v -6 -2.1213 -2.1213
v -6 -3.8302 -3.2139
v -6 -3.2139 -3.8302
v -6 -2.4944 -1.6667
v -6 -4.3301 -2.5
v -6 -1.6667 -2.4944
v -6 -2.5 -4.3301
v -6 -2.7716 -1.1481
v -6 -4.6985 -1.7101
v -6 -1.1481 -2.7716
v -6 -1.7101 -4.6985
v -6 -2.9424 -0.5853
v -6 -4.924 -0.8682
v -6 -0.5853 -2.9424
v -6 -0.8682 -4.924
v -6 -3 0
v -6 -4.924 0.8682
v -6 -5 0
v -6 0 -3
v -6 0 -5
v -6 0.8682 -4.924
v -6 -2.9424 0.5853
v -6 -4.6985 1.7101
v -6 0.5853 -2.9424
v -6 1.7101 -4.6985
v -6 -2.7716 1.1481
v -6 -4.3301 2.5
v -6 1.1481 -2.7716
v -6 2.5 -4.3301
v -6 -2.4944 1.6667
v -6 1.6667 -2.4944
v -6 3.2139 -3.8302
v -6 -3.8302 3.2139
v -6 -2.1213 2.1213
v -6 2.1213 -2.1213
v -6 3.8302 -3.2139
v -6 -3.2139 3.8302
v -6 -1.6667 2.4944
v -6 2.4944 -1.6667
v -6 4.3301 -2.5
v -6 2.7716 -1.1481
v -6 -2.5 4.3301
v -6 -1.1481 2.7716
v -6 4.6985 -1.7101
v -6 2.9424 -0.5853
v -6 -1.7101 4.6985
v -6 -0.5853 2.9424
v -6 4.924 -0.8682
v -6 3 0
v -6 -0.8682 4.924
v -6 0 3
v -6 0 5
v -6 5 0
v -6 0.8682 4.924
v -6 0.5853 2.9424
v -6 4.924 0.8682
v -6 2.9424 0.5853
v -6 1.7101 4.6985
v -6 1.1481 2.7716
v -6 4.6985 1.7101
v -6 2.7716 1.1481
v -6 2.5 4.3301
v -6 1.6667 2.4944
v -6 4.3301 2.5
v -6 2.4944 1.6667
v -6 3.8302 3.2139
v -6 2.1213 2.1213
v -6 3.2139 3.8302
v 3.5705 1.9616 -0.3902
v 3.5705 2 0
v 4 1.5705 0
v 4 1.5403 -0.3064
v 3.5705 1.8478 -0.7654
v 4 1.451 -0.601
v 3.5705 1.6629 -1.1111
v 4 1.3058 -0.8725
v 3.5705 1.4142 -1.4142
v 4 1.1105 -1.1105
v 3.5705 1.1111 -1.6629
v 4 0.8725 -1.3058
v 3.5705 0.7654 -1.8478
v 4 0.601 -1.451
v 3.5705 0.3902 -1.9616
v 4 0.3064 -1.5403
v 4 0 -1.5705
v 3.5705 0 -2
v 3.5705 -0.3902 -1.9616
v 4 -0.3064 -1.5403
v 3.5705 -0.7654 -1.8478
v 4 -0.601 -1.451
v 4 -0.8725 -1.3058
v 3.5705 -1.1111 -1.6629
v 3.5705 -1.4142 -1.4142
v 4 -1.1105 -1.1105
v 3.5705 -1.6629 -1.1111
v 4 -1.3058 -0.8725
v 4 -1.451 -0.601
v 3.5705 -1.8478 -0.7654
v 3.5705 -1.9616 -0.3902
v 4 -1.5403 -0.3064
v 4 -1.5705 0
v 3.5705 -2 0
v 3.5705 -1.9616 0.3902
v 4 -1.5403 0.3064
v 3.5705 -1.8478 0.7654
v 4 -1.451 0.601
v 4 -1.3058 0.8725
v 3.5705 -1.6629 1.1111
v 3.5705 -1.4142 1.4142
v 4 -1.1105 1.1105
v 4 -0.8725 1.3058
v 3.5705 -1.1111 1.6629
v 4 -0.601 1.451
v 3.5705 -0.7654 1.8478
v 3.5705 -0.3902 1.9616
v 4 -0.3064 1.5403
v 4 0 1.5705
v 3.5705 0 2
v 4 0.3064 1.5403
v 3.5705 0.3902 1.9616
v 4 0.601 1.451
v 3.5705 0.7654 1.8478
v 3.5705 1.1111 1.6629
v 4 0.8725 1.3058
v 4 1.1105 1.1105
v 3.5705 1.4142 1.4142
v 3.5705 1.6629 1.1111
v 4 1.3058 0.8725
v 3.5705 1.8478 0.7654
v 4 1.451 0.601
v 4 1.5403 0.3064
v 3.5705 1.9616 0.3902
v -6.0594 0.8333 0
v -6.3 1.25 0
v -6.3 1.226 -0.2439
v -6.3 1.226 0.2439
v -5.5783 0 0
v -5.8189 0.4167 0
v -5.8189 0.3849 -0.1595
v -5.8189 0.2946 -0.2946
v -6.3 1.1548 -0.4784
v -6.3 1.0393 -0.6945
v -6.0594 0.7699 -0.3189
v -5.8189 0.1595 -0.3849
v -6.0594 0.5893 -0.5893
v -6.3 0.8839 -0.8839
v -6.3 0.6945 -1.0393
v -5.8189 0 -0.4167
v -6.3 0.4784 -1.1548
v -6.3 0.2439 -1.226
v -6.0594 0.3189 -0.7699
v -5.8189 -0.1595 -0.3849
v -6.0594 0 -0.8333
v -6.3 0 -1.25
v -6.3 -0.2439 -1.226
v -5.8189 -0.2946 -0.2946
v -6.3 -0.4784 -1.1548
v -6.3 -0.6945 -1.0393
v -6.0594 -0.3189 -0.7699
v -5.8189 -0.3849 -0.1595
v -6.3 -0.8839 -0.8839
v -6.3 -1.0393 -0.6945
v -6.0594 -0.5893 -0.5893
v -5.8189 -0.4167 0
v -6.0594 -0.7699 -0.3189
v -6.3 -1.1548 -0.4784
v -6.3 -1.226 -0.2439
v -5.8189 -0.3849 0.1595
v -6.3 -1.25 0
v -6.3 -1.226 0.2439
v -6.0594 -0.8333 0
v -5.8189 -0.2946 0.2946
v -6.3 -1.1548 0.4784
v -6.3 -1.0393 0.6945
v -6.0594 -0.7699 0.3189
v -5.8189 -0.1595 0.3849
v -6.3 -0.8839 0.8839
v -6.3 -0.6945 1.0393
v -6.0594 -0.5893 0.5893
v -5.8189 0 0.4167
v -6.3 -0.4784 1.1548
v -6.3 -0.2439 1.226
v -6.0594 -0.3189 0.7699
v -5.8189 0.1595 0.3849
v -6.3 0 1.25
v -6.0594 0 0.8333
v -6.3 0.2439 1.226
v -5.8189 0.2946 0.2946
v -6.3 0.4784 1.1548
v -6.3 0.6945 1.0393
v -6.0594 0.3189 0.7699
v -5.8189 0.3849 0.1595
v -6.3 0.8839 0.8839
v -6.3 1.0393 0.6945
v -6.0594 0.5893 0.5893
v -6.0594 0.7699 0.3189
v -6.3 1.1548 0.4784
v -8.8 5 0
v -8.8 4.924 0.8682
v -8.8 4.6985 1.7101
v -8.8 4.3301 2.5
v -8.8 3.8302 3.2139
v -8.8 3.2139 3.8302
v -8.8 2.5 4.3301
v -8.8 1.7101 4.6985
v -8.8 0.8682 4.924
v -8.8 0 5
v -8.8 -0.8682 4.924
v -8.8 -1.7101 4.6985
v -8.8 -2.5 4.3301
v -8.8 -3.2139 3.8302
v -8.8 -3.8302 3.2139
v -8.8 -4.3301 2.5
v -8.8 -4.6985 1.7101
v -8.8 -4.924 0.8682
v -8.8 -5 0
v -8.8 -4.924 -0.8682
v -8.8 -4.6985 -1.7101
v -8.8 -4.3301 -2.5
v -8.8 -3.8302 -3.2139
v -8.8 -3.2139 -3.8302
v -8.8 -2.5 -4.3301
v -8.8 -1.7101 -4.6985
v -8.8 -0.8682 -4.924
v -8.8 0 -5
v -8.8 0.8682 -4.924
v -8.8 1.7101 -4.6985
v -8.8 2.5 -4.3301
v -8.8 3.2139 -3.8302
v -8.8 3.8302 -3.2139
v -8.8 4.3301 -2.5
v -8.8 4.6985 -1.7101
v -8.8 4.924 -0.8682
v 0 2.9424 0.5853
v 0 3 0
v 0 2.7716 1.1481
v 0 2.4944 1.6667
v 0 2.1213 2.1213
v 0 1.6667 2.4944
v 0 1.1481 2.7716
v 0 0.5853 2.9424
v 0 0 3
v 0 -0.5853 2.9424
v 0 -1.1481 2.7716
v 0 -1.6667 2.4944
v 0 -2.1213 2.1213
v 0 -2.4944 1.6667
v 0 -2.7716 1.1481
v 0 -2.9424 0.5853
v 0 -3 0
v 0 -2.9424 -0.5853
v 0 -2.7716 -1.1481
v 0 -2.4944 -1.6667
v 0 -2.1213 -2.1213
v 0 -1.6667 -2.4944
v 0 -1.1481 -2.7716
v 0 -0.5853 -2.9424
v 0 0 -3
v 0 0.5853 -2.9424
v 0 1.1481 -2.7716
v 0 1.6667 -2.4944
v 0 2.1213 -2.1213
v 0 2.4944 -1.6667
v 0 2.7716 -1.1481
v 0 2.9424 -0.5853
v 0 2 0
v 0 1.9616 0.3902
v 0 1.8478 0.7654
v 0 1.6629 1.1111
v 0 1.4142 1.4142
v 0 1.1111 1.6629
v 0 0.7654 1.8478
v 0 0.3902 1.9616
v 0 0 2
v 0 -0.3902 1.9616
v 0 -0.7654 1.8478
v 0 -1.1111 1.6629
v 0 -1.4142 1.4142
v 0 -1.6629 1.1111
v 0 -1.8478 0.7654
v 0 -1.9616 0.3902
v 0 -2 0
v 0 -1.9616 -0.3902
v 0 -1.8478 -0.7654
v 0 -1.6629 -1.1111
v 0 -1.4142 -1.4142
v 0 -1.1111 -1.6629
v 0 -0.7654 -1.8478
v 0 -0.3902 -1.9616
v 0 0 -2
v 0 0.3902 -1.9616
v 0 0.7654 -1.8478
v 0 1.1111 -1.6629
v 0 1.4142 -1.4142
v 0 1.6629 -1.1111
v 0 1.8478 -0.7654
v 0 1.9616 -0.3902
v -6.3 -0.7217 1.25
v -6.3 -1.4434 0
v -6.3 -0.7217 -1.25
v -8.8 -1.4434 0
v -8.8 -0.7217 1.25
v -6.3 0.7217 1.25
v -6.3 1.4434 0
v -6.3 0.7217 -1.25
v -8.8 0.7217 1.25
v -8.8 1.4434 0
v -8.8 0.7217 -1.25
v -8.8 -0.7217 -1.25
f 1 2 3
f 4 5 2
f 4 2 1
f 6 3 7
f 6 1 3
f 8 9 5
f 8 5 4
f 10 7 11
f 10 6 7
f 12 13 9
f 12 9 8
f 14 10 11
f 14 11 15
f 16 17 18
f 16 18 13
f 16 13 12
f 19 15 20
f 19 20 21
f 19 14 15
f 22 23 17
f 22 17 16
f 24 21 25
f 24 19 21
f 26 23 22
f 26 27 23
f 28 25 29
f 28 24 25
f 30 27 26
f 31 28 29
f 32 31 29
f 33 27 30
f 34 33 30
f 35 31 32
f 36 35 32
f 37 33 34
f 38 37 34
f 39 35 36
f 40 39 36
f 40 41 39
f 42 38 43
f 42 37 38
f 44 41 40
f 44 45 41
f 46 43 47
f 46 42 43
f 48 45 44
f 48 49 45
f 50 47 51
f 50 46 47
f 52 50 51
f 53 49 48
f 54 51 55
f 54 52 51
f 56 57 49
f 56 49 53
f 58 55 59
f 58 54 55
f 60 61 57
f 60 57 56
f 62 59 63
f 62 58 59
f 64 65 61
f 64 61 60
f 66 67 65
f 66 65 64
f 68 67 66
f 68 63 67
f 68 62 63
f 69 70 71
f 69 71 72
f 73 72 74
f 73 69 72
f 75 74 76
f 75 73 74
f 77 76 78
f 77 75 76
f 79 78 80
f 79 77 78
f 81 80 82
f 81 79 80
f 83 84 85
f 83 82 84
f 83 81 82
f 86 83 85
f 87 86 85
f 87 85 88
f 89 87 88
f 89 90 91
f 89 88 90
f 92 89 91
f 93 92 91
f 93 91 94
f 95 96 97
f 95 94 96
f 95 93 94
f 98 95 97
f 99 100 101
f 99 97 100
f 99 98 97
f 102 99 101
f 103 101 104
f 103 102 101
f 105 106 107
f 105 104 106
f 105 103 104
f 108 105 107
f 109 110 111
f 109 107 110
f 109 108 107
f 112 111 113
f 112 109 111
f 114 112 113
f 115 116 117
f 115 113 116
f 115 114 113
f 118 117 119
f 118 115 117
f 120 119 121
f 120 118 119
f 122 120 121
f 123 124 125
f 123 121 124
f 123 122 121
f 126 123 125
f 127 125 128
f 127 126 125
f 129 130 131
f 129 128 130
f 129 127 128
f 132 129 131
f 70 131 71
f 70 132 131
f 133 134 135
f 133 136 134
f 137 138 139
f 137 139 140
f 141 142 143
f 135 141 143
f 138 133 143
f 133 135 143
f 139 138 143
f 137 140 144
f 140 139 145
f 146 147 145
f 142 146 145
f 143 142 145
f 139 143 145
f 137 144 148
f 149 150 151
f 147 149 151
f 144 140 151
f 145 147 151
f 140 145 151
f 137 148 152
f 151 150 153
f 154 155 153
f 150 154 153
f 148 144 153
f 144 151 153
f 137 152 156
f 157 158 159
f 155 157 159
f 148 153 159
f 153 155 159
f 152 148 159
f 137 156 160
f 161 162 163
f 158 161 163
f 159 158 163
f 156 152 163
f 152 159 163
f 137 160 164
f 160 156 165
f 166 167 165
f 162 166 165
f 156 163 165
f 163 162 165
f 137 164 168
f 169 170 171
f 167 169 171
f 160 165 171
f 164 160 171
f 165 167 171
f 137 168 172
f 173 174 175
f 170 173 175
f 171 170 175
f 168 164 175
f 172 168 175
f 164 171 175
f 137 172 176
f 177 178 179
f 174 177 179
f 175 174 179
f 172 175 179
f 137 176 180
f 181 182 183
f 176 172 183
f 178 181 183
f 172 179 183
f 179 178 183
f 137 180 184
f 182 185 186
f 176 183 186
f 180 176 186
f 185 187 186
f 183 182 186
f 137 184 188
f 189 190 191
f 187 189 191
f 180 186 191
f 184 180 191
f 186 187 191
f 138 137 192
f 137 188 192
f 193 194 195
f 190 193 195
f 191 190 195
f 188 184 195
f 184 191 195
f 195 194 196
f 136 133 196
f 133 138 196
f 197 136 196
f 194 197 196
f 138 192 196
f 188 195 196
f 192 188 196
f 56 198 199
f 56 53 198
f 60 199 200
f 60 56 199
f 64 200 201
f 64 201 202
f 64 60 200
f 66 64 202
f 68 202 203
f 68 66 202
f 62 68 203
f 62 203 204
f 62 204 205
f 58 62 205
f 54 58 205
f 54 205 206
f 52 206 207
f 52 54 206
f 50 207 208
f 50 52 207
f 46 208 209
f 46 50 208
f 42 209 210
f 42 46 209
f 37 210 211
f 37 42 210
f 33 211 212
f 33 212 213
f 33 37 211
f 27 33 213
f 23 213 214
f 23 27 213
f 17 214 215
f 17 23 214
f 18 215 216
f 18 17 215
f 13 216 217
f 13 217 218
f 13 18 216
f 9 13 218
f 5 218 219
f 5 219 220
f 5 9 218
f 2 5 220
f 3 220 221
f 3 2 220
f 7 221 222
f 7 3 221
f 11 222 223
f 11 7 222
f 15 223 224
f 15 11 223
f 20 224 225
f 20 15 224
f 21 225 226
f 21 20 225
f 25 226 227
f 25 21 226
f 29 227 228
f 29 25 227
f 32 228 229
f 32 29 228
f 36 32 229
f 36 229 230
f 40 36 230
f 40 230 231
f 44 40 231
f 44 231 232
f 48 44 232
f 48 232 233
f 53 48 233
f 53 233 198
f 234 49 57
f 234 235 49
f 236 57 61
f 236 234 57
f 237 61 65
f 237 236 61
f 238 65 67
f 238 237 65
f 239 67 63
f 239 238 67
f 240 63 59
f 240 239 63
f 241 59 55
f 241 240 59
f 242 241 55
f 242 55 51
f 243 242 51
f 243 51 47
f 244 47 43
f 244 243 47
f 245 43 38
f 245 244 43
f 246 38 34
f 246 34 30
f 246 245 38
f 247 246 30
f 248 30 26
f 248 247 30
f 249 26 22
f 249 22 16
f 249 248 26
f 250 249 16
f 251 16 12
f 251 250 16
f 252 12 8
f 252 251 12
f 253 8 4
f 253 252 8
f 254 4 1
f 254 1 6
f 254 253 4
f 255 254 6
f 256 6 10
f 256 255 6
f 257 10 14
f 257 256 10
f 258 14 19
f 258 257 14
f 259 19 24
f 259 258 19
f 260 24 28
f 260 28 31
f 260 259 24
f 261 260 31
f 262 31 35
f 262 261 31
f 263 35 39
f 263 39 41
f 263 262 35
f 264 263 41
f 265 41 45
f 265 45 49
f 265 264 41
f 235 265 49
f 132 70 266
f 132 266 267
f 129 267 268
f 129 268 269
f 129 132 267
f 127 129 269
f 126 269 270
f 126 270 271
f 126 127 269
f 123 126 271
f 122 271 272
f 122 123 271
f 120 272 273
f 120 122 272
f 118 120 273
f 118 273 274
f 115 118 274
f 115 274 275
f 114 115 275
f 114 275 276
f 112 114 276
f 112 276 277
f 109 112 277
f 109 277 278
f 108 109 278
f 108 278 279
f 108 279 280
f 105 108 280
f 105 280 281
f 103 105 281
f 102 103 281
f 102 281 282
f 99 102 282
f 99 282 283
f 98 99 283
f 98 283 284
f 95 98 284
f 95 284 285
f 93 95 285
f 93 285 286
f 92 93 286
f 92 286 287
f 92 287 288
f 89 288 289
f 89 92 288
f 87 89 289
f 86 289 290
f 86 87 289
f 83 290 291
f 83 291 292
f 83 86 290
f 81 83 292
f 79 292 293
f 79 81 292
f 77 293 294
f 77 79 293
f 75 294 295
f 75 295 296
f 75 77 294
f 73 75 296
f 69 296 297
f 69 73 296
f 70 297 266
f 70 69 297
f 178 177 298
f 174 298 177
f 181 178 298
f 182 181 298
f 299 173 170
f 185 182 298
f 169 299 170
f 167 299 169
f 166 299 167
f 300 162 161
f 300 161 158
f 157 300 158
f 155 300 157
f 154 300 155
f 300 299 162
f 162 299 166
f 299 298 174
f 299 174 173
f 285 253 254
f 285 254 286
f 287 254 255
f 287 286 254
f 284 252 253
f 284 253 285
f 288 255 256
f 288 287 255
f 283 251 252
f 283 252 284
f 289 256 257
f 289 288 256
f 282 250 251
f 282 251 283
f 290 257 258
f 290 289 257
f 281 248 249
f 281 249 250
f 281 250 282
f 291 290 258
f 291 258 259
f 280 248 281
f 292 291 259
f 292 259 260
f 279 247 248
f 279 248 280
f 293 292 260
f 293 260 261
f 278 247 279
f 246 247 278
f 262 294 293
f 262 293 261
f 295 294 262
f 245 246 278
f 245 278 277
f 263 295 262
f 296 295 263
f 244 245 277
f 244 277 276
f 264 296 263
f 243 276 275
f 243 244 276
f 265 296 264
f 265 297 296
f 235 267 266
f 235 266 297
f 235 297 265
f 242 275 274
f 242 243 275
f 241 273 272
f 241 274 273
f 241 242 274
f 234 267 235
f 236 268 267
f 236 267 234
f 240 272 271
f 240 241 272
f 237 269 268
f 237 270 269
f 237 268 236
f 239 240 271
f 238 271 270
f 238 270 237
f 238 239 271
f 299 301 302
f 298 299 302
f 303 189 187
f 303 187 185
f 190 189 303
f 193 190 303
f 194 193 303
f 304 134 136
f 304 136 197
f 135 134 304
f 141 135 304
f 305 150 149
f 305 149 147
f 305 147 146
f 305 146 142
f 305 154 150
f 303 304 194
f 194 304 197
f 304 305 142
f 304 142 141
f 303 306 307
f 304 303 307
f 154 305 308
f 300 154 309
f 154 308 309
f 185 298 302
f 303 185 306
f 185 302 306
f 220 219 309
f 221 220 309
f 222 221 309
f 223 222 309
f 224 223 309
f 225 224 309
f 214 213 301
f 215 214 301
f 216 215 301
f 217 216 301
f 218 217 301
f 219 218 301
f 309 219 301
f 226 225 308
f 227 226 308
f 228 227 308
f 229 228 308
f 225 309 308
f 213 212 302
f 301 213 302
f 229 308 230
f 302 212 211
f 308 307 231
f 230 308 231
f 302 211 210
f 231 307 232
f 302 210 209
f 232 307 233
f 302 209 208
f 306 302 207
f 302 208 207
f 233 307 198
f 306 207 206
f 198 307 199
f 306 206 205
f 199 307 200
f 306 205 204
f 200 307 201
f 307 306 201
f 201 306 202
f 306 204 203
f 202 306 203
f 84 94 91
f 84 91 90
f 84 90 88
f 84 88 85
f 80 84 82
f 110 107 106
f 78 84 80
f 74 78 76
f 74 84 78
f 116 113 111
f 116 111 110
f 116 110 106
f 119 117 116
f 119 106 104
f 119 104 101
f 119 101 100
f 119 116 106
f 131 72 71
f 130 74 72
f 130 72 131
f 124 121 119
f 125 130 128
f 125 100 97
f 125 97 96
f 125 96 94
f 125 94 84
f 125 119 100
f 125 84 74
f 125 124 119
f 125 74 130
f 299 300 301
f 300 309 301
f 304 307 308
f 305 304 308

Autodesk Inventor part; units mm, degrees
ref_plane "YZ Plane" through (0, 0, 0) normal (1, 0, 0) x (0, 1, 0)
ref_plane "XZ Plane" through (0, 0, 0) normal (0, 1, 0) x (-1, 0, 0)
ref_plane "XY Plane" through (0, 0, 0) normal (0, 0, 1) x (1, 0, 0)
sketch "Sketch_1" plane through (0, 0, 0) normal (0, 0, 1) x (1, 0, 0)
  line L0 (4, 0) -> (-8.8, 0)
  line L1 (-8.8, 0) -> (-8.8, 5)
  line L2 (-8.8, 5) -> (-6, 5)
  line L3 (-6, 5) -> (-6, 3)
  line L4 (-6, 3) -> (0, 3)
  line L5 (0, 3) -> (0, 2)
  line L6 (0, 2) -> (3.5705, 2)
  line L7 (3.5705, 2) -> (4, 1.5705)
  line L8 (4, 1.5705) -> (4, 0)
  line L9 (4, 0) -> (-8.8, 0)
revolve "Revolution1" add sketch "Sketch_1" angle 360 about axis through (4, 0, 0) along (1, 0, 0)
thread "Thread1" size "M4x0.7" class "6g" standard "ISO Metric profile" length 2.3705
sketch "Sketch_2" plane through (-8.8, 0, 0) normal (-1, 0, 0) x (0, 1, 0)
  line L0 (-1.4434, 0) -> (-0.7217, -1.25)
  line L1 (-0.7217, -1.25) -> (0.7217, -1.25)
  line L2 (0.7217, -1.25) -> (1.4434, 0)
  line L3 (1.4434, 0) -> (0.7217, 1.25)
  line L4 (0.7217, 1.25) -> (-0.7217, 1.25)
  line L5 (-0.7217, 1.25) -> (-1.4434, 0)
extrude "Extrusion1" cut sketch "Sketch_2" against normal blind 2.5
sketch "Sketch_3" plane through (0, 0, 0) normal (0, 0, 1) x (1, 0, 0)
  line L0 (-5.5783, 0) -> (-6.3, 0)
  line L1 (-6.3, 0) -> (-6.3, 1.25)
  line L2 (-6.3, 1.25) -> (-5.5783, 0)
  line L3 (-5.5783, 0) -> (-6.3, 0)
revolve "Revolution2" cut sketch "Sketch_3" angle 360 about axis through (-5.5783, 0, 0) along (1, 0, 0)
properties part number "DBS4-6-4"
